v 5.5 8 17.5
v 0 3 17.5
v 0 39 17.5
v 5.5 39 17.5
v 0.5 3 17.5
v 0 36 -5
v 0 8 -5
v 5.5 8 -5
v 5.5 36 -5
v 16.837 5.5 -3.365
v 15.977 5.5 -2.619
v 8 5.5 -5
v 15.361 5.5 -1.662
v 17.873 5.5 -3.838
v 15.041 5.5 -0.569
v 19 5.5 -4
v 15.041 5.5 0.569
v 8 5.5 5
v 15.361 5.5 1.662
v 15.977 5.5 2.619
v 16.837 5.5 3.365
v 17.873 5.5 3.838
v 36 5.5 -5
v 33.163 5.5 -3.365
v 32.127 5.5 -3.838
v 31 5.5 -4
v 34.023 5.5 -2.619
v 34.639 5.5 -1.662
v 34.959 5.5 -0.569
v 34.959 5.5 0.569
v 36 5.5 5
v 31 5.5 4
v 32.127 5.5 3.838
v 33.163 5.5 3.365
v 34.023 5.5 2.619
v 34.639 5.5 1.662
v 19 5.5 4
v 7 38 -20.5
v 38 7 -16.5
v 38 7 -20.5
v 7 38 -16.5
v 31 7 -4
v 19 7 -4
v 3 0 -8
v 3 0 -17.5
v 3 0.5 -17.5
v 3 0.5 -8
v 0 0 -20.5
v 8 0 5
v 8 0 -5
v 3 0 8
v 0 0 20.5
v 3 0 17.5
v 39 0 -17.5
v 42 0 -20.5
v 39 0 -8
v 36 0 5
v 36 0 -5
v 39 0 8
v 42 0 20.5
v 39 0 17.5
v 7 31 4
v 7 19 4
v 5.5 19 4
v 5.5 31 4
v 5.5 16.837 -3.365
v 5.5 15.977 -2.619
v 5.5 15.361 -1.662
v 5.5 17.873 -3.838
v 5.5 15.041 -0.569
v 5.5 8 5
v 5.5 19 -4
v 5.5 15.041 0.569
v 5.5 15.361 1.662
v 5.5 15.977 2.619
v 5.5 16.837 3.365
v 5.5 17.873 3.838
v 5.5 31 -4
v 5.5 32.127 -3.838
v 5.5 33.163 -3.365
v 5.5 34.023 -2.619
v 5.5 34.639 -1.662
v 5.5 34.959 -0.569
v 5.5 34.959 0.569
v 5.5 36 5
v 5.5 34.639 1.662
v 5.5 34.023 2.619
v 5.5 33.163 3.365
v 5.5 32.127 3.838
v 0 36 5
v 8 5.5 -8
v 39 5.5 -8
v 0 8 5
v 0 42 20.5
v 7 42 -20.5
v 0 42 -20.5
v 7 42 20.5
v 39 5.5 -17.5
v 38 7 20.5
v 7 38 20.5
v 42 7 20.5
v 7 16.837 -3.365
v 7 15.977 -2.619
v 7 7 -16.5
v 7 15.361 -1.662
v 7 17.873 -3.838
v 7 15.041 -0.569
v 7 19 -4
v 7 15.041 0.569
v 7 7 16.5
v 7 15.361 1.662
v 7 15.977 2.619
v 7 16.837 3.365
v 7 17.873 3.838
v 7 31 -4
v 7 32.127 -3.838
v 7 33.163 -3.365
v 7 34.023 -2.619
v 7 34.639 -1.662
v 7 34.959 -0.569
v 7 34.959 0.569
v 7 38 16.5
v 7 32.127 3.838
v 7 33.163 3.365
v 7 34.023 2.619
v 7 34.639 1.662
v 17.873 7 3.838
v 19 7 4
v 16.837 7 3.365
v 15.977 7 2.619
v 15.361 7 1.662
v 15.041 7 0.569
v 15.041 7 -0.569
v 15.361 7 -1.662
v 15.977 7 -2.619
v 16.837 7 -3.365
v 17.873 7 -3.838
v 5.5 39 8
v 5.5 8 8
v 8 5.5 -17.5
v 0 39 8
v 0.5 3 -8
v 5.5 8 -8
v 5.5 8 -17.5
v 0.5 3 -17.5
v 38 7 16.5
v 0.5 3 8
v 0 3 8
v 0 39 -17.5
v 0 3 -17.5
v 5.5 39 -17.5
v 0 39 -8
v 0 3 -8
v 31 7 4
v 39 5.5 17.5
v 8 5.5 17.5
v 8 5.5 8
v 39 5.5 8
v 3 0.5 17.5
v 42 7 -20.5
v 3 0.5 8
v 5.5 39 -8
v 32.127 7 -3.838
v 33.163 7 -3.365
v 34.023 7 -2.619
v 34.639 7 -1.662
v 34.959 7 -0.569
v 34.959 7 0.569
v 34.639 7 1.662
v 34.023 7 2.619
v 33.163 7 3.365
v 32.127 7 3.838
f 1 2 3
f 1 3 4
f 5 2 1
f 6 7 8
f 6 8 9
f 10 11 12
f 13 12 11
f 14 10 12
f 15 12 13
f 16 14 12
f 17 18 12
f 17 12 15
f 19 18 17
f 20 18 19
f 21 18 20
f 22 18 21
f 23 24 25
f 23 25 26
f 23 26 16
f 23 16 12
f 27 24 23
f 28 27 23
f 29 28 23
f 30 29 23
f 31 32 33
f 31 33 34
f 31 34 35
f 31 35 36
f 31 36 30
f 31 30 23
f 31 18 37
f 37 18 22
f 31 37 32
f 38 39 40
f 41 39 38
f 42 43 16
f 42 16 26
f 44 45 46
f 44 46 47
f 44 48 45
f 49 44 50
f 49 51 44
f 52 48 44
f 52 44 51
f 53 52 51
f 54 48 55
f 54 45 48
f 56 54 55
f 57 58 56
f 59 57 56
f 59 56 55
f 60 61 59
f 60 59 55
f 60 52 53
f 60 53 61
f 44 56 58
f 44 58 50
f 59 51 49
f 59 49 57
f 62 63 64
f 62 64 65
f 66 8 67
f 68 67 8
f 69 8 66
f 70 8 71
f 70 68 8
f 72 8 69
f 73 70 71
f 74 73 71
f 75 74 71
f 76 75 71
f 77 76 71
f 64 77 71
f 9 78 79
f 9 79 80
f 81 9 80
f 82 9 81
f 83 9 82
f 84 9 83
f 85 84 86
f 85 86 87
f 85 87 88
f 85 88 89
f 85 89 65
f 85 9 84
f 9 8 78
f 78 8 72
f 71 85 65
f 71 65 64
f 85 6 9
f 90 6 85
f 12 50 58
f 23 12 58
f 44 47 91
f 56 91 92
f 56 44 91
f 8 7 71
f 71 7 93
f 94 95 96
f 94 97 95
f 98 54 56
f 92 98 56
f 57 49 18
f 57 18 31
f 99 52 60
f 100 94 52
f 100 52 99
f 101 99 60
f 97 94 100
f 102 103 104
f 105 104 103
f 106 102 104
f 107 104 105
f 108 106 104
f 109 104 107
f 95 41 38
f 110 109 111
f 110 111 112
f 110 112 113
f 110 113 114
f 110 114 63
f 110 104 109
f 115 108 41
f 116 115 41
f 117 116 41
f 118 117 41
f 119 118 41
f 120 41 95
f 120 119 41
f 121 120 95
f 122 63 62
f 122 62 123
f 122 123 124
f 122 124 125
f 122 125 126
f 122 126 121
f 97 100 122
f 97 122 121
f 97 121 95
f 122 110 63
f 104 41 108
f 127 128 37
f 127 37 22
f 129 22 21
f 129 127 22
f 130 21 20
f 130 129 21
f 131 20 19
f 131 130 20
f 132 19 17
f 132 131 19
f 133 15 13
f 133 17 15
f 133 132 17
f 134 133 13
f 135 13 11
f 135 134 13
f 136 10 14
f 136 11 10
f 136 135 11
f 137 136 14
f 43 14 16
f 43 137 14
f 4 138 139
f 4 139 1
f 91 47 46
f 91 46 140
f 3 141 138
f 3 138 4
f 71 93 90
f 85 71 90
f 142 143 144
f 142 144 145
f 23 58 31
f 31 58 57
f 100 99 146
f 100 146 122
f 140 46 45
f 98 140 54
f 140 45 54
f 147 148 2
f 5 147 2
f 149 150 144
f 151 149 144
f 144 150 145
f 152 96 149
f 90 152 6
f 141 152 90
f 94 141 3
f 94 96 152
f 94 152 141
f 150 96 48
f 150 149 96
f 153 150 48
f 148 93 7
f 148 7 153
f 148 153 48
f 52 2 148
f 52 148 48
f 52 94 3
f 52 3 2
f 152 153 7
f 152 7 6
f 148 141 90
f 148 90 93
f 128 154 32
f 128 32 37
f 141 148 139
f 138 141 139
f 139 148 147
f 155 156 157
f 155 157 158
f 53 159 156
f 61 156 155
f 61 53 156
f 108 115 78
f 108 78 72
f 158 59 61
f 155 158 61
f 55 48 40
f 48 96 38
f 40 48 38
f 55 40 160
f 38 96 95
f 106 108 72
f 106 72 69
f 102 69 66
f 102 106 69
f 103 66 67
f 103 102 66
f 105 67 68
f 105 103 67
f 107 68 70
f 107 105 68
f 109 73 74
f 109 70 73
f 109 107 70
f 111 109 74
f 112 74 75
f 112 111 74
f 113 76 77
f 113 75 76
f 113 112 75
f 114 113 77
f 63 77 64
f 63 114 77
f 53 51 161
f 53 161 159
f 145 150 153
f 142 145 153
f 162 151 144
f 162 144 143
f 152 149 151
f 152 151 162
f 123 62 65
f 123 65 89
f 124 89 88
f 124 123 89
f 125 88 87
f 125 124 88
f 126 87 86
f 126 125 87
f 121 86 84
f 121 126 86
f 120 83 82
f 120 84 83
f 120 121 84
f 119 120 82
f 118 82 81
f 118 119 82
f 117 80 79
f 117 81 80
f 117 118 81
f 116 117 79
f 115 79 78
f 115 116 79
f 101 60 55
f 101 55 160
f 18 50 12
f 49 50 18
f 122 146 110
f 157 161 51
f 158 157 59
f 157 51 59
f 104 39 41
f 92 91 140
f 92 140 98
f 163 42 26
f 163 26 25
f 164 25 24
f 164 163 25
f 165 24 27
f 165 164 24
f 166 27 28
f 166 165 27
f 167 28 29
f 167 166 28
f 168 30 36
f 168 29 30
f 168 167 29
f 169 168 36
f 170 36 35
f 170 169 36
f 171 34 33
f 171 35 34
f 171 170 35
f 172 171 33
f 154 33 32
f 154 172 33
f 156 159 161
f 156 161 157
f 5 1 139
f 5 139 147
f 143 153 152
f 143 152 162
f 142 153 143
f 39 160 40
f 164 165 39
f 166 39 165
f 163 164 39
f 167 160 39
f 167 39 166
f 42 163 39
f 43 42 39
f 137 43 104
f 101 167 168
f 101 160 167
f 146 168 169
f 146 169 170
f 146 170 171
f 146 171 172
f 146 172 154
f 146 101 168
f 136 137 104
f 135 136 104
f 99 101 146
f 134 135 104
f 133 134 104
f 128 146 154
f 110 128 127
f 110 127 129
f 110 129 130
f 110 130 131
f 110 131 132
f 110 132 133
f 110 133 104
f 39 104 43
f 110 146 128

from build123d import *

# Parameters (mm, degrees)
AUFSATZ_LINEAR_AUSTRAGEN1_DEPTH = 20.5
SKIZZE2_W                       = 33
SKIZZE2_H                       = 31
SCHNITT_LINEAR_AUSTRAGEN1_DEPTH = 35
SCHNITT_LINEAR_AUSTRAGEN2_DEPTH = 10
SCHNITT_LINEAR_AUSTRAGEN3_DEPTH = 10
SKIZZE5_W                       = 9.5
SKIZZE5_H                       = 36
SKIZZE5_W_2                     = 10
SKIZZE5_H_2                     = 28
SCHNITT_LINEAR_AUSTRAGEN4_DEPTH = 5.5
SKIZZE6_W                       = 28
SKIZZE6_H                       = 10
SKIZZE6_W_2                     = 36
SKIZZE6_H_2                     = 9.5
SCHNITT_LINEAR_AUSTRAGEN5_DEPTH = 5.5
AUFSATZ_LINEAR_AUSTRAGEN2_DEPTH = 9.5
AUFSATZ_LINEAR_AUSTRAGEN3_DEPTH = 9.5


with BuildPart() as part:
    # Skizze1 → Aufsatz-Linear austragen1 (new, symmetric)
    with BuildSketch(Plane.XY):
        Polygon((0, 0), (42, 0), (42, 7), (38, 7), (7, 38), (7, 42), (0, 42), align=None)
    extrude(amount=AUFSATZ_LINEAR_AUSTRAGEN1_DEPTH, both=True)

    # Skizze2 → Schnitt-Linear austragen1 (cut)
    with BuildSketch(Plane(origin=(42, 0, 0), x_dir=(0, 0, -1), z_dir=(1, 0, 0))):
        with Locations((0, 22.5)):
            Rectangle(SKIZZE2_W, SKIZZE2_H)
    extrude(amount=-SCHNITT_LINEAR_AUSTRAGEN1_DEPTH, mode=Mode.SUBTRACT)

    # Skizze3 → Schnitt-Linear austragen2 (cut)
    with BuildSketch(Plane(origin=(7, 0, 0), x_dir=(0, 0, -1), z_dir=(1, 0, 0))):
        with BuildLine():
            Line((-4, 19), (-4, 31))
            ThreePointArc((-4, 31), (0, 35), (4, 31))
            Line((4, 31), (4, 19))
            ThreePointArc((4, 19), (0, 15), (-4, 19))
        make_face()
    extrude(amount=-SCHNITT_LINEAR_AUSTRAGEN2_DEPTH, mode=Mode.SUBTRACT)

    # Skizze4 → Schnitt-Linear austragen3 (cut)
    with BuildSketch(Plane(origin=(0, 7, 0), x_dir=(1, 0, 0), z_dir=(0, 1, 0))):
        with BuildLine():
            Line((19, 4), (31, 4))
            ThreePointArc((31, 4), (35, 0), (31, -4))
            Line((31, -4), (19, -4))
            ThreePointArc((19, -4), (15, 0), (19, 4))
        make_face()
    extrude(amount=-SCHNITT_LINEAR_AUSTRAGEN3_DEPTH, mode=Mode.SUBTRACT)

    # Skizze5 → Schnitt-Linear austragen4 (cut)
    with BuildSketch(Plane.ZY):
        with Locations((12.75, 21)):
            Rectangle(SKIZZE5_W, SKIZZE5_H)
        with Locations((0, 22)):
            Rectangle(SKIZZE5_W_2, SKIZZE5_H_2)
        with Locations((-12.75, 21)):
            Rectangle(SKIZZE5_W, SKIZZE5_H)
    extrude(amount=-SCHNITT_LINEAR_AUSTRAGEN4_DEPTH, mode=Mode.SUBTRACT)

    # Skizze6 → Schnitt-Linear austragen5 (cut)
    with BuildSketch(Plane.XZ):
        with Locations((22, 0)):
            Rectangle(SKIZZE6_W, SKIZZE6_H)
        with Locations((21, 12.75)):
            Rectangle(SKIZZE6_W_2, SKIZZE6_H_2)
        with Locations((21, -12.75)):
            Rectangle(SKIZZE6_W_2, SKIZZE6_H_2)
    extrude(amount=-SCHNITT_LINEAR_AUSTRAGEN5_DEPTH, mode=Mode.SUBTRACT)

    # Skizze7 → Aufsatz-Linear austragen2 (add)
    with BuildSketch(Plane.XY.offset(8)):
        Polygon((3, 0.5), (8, 5.5), (5.5, 5.5), (5.5, 8), (0.5, 3), (3, 3), align=None)
    extrude(amount=AUFSATZ_LINEAR_AUSTRAGEN2_DEPTH)

    # Skizze8 → Aufsatz-Linear austragen3 (add)
    with BuildSketch(Plane.XY.offset(-17.5)):
        Polygon((3, 0.5), (8, 5.5), (5.5, 5.5), (5.5, 8), (0.5, 3), (3, 3), align=None)
    extrude(amount=AUFSATZ_LINEAR_AUSTRAGEN3_DEPTH)


solid = part.part
